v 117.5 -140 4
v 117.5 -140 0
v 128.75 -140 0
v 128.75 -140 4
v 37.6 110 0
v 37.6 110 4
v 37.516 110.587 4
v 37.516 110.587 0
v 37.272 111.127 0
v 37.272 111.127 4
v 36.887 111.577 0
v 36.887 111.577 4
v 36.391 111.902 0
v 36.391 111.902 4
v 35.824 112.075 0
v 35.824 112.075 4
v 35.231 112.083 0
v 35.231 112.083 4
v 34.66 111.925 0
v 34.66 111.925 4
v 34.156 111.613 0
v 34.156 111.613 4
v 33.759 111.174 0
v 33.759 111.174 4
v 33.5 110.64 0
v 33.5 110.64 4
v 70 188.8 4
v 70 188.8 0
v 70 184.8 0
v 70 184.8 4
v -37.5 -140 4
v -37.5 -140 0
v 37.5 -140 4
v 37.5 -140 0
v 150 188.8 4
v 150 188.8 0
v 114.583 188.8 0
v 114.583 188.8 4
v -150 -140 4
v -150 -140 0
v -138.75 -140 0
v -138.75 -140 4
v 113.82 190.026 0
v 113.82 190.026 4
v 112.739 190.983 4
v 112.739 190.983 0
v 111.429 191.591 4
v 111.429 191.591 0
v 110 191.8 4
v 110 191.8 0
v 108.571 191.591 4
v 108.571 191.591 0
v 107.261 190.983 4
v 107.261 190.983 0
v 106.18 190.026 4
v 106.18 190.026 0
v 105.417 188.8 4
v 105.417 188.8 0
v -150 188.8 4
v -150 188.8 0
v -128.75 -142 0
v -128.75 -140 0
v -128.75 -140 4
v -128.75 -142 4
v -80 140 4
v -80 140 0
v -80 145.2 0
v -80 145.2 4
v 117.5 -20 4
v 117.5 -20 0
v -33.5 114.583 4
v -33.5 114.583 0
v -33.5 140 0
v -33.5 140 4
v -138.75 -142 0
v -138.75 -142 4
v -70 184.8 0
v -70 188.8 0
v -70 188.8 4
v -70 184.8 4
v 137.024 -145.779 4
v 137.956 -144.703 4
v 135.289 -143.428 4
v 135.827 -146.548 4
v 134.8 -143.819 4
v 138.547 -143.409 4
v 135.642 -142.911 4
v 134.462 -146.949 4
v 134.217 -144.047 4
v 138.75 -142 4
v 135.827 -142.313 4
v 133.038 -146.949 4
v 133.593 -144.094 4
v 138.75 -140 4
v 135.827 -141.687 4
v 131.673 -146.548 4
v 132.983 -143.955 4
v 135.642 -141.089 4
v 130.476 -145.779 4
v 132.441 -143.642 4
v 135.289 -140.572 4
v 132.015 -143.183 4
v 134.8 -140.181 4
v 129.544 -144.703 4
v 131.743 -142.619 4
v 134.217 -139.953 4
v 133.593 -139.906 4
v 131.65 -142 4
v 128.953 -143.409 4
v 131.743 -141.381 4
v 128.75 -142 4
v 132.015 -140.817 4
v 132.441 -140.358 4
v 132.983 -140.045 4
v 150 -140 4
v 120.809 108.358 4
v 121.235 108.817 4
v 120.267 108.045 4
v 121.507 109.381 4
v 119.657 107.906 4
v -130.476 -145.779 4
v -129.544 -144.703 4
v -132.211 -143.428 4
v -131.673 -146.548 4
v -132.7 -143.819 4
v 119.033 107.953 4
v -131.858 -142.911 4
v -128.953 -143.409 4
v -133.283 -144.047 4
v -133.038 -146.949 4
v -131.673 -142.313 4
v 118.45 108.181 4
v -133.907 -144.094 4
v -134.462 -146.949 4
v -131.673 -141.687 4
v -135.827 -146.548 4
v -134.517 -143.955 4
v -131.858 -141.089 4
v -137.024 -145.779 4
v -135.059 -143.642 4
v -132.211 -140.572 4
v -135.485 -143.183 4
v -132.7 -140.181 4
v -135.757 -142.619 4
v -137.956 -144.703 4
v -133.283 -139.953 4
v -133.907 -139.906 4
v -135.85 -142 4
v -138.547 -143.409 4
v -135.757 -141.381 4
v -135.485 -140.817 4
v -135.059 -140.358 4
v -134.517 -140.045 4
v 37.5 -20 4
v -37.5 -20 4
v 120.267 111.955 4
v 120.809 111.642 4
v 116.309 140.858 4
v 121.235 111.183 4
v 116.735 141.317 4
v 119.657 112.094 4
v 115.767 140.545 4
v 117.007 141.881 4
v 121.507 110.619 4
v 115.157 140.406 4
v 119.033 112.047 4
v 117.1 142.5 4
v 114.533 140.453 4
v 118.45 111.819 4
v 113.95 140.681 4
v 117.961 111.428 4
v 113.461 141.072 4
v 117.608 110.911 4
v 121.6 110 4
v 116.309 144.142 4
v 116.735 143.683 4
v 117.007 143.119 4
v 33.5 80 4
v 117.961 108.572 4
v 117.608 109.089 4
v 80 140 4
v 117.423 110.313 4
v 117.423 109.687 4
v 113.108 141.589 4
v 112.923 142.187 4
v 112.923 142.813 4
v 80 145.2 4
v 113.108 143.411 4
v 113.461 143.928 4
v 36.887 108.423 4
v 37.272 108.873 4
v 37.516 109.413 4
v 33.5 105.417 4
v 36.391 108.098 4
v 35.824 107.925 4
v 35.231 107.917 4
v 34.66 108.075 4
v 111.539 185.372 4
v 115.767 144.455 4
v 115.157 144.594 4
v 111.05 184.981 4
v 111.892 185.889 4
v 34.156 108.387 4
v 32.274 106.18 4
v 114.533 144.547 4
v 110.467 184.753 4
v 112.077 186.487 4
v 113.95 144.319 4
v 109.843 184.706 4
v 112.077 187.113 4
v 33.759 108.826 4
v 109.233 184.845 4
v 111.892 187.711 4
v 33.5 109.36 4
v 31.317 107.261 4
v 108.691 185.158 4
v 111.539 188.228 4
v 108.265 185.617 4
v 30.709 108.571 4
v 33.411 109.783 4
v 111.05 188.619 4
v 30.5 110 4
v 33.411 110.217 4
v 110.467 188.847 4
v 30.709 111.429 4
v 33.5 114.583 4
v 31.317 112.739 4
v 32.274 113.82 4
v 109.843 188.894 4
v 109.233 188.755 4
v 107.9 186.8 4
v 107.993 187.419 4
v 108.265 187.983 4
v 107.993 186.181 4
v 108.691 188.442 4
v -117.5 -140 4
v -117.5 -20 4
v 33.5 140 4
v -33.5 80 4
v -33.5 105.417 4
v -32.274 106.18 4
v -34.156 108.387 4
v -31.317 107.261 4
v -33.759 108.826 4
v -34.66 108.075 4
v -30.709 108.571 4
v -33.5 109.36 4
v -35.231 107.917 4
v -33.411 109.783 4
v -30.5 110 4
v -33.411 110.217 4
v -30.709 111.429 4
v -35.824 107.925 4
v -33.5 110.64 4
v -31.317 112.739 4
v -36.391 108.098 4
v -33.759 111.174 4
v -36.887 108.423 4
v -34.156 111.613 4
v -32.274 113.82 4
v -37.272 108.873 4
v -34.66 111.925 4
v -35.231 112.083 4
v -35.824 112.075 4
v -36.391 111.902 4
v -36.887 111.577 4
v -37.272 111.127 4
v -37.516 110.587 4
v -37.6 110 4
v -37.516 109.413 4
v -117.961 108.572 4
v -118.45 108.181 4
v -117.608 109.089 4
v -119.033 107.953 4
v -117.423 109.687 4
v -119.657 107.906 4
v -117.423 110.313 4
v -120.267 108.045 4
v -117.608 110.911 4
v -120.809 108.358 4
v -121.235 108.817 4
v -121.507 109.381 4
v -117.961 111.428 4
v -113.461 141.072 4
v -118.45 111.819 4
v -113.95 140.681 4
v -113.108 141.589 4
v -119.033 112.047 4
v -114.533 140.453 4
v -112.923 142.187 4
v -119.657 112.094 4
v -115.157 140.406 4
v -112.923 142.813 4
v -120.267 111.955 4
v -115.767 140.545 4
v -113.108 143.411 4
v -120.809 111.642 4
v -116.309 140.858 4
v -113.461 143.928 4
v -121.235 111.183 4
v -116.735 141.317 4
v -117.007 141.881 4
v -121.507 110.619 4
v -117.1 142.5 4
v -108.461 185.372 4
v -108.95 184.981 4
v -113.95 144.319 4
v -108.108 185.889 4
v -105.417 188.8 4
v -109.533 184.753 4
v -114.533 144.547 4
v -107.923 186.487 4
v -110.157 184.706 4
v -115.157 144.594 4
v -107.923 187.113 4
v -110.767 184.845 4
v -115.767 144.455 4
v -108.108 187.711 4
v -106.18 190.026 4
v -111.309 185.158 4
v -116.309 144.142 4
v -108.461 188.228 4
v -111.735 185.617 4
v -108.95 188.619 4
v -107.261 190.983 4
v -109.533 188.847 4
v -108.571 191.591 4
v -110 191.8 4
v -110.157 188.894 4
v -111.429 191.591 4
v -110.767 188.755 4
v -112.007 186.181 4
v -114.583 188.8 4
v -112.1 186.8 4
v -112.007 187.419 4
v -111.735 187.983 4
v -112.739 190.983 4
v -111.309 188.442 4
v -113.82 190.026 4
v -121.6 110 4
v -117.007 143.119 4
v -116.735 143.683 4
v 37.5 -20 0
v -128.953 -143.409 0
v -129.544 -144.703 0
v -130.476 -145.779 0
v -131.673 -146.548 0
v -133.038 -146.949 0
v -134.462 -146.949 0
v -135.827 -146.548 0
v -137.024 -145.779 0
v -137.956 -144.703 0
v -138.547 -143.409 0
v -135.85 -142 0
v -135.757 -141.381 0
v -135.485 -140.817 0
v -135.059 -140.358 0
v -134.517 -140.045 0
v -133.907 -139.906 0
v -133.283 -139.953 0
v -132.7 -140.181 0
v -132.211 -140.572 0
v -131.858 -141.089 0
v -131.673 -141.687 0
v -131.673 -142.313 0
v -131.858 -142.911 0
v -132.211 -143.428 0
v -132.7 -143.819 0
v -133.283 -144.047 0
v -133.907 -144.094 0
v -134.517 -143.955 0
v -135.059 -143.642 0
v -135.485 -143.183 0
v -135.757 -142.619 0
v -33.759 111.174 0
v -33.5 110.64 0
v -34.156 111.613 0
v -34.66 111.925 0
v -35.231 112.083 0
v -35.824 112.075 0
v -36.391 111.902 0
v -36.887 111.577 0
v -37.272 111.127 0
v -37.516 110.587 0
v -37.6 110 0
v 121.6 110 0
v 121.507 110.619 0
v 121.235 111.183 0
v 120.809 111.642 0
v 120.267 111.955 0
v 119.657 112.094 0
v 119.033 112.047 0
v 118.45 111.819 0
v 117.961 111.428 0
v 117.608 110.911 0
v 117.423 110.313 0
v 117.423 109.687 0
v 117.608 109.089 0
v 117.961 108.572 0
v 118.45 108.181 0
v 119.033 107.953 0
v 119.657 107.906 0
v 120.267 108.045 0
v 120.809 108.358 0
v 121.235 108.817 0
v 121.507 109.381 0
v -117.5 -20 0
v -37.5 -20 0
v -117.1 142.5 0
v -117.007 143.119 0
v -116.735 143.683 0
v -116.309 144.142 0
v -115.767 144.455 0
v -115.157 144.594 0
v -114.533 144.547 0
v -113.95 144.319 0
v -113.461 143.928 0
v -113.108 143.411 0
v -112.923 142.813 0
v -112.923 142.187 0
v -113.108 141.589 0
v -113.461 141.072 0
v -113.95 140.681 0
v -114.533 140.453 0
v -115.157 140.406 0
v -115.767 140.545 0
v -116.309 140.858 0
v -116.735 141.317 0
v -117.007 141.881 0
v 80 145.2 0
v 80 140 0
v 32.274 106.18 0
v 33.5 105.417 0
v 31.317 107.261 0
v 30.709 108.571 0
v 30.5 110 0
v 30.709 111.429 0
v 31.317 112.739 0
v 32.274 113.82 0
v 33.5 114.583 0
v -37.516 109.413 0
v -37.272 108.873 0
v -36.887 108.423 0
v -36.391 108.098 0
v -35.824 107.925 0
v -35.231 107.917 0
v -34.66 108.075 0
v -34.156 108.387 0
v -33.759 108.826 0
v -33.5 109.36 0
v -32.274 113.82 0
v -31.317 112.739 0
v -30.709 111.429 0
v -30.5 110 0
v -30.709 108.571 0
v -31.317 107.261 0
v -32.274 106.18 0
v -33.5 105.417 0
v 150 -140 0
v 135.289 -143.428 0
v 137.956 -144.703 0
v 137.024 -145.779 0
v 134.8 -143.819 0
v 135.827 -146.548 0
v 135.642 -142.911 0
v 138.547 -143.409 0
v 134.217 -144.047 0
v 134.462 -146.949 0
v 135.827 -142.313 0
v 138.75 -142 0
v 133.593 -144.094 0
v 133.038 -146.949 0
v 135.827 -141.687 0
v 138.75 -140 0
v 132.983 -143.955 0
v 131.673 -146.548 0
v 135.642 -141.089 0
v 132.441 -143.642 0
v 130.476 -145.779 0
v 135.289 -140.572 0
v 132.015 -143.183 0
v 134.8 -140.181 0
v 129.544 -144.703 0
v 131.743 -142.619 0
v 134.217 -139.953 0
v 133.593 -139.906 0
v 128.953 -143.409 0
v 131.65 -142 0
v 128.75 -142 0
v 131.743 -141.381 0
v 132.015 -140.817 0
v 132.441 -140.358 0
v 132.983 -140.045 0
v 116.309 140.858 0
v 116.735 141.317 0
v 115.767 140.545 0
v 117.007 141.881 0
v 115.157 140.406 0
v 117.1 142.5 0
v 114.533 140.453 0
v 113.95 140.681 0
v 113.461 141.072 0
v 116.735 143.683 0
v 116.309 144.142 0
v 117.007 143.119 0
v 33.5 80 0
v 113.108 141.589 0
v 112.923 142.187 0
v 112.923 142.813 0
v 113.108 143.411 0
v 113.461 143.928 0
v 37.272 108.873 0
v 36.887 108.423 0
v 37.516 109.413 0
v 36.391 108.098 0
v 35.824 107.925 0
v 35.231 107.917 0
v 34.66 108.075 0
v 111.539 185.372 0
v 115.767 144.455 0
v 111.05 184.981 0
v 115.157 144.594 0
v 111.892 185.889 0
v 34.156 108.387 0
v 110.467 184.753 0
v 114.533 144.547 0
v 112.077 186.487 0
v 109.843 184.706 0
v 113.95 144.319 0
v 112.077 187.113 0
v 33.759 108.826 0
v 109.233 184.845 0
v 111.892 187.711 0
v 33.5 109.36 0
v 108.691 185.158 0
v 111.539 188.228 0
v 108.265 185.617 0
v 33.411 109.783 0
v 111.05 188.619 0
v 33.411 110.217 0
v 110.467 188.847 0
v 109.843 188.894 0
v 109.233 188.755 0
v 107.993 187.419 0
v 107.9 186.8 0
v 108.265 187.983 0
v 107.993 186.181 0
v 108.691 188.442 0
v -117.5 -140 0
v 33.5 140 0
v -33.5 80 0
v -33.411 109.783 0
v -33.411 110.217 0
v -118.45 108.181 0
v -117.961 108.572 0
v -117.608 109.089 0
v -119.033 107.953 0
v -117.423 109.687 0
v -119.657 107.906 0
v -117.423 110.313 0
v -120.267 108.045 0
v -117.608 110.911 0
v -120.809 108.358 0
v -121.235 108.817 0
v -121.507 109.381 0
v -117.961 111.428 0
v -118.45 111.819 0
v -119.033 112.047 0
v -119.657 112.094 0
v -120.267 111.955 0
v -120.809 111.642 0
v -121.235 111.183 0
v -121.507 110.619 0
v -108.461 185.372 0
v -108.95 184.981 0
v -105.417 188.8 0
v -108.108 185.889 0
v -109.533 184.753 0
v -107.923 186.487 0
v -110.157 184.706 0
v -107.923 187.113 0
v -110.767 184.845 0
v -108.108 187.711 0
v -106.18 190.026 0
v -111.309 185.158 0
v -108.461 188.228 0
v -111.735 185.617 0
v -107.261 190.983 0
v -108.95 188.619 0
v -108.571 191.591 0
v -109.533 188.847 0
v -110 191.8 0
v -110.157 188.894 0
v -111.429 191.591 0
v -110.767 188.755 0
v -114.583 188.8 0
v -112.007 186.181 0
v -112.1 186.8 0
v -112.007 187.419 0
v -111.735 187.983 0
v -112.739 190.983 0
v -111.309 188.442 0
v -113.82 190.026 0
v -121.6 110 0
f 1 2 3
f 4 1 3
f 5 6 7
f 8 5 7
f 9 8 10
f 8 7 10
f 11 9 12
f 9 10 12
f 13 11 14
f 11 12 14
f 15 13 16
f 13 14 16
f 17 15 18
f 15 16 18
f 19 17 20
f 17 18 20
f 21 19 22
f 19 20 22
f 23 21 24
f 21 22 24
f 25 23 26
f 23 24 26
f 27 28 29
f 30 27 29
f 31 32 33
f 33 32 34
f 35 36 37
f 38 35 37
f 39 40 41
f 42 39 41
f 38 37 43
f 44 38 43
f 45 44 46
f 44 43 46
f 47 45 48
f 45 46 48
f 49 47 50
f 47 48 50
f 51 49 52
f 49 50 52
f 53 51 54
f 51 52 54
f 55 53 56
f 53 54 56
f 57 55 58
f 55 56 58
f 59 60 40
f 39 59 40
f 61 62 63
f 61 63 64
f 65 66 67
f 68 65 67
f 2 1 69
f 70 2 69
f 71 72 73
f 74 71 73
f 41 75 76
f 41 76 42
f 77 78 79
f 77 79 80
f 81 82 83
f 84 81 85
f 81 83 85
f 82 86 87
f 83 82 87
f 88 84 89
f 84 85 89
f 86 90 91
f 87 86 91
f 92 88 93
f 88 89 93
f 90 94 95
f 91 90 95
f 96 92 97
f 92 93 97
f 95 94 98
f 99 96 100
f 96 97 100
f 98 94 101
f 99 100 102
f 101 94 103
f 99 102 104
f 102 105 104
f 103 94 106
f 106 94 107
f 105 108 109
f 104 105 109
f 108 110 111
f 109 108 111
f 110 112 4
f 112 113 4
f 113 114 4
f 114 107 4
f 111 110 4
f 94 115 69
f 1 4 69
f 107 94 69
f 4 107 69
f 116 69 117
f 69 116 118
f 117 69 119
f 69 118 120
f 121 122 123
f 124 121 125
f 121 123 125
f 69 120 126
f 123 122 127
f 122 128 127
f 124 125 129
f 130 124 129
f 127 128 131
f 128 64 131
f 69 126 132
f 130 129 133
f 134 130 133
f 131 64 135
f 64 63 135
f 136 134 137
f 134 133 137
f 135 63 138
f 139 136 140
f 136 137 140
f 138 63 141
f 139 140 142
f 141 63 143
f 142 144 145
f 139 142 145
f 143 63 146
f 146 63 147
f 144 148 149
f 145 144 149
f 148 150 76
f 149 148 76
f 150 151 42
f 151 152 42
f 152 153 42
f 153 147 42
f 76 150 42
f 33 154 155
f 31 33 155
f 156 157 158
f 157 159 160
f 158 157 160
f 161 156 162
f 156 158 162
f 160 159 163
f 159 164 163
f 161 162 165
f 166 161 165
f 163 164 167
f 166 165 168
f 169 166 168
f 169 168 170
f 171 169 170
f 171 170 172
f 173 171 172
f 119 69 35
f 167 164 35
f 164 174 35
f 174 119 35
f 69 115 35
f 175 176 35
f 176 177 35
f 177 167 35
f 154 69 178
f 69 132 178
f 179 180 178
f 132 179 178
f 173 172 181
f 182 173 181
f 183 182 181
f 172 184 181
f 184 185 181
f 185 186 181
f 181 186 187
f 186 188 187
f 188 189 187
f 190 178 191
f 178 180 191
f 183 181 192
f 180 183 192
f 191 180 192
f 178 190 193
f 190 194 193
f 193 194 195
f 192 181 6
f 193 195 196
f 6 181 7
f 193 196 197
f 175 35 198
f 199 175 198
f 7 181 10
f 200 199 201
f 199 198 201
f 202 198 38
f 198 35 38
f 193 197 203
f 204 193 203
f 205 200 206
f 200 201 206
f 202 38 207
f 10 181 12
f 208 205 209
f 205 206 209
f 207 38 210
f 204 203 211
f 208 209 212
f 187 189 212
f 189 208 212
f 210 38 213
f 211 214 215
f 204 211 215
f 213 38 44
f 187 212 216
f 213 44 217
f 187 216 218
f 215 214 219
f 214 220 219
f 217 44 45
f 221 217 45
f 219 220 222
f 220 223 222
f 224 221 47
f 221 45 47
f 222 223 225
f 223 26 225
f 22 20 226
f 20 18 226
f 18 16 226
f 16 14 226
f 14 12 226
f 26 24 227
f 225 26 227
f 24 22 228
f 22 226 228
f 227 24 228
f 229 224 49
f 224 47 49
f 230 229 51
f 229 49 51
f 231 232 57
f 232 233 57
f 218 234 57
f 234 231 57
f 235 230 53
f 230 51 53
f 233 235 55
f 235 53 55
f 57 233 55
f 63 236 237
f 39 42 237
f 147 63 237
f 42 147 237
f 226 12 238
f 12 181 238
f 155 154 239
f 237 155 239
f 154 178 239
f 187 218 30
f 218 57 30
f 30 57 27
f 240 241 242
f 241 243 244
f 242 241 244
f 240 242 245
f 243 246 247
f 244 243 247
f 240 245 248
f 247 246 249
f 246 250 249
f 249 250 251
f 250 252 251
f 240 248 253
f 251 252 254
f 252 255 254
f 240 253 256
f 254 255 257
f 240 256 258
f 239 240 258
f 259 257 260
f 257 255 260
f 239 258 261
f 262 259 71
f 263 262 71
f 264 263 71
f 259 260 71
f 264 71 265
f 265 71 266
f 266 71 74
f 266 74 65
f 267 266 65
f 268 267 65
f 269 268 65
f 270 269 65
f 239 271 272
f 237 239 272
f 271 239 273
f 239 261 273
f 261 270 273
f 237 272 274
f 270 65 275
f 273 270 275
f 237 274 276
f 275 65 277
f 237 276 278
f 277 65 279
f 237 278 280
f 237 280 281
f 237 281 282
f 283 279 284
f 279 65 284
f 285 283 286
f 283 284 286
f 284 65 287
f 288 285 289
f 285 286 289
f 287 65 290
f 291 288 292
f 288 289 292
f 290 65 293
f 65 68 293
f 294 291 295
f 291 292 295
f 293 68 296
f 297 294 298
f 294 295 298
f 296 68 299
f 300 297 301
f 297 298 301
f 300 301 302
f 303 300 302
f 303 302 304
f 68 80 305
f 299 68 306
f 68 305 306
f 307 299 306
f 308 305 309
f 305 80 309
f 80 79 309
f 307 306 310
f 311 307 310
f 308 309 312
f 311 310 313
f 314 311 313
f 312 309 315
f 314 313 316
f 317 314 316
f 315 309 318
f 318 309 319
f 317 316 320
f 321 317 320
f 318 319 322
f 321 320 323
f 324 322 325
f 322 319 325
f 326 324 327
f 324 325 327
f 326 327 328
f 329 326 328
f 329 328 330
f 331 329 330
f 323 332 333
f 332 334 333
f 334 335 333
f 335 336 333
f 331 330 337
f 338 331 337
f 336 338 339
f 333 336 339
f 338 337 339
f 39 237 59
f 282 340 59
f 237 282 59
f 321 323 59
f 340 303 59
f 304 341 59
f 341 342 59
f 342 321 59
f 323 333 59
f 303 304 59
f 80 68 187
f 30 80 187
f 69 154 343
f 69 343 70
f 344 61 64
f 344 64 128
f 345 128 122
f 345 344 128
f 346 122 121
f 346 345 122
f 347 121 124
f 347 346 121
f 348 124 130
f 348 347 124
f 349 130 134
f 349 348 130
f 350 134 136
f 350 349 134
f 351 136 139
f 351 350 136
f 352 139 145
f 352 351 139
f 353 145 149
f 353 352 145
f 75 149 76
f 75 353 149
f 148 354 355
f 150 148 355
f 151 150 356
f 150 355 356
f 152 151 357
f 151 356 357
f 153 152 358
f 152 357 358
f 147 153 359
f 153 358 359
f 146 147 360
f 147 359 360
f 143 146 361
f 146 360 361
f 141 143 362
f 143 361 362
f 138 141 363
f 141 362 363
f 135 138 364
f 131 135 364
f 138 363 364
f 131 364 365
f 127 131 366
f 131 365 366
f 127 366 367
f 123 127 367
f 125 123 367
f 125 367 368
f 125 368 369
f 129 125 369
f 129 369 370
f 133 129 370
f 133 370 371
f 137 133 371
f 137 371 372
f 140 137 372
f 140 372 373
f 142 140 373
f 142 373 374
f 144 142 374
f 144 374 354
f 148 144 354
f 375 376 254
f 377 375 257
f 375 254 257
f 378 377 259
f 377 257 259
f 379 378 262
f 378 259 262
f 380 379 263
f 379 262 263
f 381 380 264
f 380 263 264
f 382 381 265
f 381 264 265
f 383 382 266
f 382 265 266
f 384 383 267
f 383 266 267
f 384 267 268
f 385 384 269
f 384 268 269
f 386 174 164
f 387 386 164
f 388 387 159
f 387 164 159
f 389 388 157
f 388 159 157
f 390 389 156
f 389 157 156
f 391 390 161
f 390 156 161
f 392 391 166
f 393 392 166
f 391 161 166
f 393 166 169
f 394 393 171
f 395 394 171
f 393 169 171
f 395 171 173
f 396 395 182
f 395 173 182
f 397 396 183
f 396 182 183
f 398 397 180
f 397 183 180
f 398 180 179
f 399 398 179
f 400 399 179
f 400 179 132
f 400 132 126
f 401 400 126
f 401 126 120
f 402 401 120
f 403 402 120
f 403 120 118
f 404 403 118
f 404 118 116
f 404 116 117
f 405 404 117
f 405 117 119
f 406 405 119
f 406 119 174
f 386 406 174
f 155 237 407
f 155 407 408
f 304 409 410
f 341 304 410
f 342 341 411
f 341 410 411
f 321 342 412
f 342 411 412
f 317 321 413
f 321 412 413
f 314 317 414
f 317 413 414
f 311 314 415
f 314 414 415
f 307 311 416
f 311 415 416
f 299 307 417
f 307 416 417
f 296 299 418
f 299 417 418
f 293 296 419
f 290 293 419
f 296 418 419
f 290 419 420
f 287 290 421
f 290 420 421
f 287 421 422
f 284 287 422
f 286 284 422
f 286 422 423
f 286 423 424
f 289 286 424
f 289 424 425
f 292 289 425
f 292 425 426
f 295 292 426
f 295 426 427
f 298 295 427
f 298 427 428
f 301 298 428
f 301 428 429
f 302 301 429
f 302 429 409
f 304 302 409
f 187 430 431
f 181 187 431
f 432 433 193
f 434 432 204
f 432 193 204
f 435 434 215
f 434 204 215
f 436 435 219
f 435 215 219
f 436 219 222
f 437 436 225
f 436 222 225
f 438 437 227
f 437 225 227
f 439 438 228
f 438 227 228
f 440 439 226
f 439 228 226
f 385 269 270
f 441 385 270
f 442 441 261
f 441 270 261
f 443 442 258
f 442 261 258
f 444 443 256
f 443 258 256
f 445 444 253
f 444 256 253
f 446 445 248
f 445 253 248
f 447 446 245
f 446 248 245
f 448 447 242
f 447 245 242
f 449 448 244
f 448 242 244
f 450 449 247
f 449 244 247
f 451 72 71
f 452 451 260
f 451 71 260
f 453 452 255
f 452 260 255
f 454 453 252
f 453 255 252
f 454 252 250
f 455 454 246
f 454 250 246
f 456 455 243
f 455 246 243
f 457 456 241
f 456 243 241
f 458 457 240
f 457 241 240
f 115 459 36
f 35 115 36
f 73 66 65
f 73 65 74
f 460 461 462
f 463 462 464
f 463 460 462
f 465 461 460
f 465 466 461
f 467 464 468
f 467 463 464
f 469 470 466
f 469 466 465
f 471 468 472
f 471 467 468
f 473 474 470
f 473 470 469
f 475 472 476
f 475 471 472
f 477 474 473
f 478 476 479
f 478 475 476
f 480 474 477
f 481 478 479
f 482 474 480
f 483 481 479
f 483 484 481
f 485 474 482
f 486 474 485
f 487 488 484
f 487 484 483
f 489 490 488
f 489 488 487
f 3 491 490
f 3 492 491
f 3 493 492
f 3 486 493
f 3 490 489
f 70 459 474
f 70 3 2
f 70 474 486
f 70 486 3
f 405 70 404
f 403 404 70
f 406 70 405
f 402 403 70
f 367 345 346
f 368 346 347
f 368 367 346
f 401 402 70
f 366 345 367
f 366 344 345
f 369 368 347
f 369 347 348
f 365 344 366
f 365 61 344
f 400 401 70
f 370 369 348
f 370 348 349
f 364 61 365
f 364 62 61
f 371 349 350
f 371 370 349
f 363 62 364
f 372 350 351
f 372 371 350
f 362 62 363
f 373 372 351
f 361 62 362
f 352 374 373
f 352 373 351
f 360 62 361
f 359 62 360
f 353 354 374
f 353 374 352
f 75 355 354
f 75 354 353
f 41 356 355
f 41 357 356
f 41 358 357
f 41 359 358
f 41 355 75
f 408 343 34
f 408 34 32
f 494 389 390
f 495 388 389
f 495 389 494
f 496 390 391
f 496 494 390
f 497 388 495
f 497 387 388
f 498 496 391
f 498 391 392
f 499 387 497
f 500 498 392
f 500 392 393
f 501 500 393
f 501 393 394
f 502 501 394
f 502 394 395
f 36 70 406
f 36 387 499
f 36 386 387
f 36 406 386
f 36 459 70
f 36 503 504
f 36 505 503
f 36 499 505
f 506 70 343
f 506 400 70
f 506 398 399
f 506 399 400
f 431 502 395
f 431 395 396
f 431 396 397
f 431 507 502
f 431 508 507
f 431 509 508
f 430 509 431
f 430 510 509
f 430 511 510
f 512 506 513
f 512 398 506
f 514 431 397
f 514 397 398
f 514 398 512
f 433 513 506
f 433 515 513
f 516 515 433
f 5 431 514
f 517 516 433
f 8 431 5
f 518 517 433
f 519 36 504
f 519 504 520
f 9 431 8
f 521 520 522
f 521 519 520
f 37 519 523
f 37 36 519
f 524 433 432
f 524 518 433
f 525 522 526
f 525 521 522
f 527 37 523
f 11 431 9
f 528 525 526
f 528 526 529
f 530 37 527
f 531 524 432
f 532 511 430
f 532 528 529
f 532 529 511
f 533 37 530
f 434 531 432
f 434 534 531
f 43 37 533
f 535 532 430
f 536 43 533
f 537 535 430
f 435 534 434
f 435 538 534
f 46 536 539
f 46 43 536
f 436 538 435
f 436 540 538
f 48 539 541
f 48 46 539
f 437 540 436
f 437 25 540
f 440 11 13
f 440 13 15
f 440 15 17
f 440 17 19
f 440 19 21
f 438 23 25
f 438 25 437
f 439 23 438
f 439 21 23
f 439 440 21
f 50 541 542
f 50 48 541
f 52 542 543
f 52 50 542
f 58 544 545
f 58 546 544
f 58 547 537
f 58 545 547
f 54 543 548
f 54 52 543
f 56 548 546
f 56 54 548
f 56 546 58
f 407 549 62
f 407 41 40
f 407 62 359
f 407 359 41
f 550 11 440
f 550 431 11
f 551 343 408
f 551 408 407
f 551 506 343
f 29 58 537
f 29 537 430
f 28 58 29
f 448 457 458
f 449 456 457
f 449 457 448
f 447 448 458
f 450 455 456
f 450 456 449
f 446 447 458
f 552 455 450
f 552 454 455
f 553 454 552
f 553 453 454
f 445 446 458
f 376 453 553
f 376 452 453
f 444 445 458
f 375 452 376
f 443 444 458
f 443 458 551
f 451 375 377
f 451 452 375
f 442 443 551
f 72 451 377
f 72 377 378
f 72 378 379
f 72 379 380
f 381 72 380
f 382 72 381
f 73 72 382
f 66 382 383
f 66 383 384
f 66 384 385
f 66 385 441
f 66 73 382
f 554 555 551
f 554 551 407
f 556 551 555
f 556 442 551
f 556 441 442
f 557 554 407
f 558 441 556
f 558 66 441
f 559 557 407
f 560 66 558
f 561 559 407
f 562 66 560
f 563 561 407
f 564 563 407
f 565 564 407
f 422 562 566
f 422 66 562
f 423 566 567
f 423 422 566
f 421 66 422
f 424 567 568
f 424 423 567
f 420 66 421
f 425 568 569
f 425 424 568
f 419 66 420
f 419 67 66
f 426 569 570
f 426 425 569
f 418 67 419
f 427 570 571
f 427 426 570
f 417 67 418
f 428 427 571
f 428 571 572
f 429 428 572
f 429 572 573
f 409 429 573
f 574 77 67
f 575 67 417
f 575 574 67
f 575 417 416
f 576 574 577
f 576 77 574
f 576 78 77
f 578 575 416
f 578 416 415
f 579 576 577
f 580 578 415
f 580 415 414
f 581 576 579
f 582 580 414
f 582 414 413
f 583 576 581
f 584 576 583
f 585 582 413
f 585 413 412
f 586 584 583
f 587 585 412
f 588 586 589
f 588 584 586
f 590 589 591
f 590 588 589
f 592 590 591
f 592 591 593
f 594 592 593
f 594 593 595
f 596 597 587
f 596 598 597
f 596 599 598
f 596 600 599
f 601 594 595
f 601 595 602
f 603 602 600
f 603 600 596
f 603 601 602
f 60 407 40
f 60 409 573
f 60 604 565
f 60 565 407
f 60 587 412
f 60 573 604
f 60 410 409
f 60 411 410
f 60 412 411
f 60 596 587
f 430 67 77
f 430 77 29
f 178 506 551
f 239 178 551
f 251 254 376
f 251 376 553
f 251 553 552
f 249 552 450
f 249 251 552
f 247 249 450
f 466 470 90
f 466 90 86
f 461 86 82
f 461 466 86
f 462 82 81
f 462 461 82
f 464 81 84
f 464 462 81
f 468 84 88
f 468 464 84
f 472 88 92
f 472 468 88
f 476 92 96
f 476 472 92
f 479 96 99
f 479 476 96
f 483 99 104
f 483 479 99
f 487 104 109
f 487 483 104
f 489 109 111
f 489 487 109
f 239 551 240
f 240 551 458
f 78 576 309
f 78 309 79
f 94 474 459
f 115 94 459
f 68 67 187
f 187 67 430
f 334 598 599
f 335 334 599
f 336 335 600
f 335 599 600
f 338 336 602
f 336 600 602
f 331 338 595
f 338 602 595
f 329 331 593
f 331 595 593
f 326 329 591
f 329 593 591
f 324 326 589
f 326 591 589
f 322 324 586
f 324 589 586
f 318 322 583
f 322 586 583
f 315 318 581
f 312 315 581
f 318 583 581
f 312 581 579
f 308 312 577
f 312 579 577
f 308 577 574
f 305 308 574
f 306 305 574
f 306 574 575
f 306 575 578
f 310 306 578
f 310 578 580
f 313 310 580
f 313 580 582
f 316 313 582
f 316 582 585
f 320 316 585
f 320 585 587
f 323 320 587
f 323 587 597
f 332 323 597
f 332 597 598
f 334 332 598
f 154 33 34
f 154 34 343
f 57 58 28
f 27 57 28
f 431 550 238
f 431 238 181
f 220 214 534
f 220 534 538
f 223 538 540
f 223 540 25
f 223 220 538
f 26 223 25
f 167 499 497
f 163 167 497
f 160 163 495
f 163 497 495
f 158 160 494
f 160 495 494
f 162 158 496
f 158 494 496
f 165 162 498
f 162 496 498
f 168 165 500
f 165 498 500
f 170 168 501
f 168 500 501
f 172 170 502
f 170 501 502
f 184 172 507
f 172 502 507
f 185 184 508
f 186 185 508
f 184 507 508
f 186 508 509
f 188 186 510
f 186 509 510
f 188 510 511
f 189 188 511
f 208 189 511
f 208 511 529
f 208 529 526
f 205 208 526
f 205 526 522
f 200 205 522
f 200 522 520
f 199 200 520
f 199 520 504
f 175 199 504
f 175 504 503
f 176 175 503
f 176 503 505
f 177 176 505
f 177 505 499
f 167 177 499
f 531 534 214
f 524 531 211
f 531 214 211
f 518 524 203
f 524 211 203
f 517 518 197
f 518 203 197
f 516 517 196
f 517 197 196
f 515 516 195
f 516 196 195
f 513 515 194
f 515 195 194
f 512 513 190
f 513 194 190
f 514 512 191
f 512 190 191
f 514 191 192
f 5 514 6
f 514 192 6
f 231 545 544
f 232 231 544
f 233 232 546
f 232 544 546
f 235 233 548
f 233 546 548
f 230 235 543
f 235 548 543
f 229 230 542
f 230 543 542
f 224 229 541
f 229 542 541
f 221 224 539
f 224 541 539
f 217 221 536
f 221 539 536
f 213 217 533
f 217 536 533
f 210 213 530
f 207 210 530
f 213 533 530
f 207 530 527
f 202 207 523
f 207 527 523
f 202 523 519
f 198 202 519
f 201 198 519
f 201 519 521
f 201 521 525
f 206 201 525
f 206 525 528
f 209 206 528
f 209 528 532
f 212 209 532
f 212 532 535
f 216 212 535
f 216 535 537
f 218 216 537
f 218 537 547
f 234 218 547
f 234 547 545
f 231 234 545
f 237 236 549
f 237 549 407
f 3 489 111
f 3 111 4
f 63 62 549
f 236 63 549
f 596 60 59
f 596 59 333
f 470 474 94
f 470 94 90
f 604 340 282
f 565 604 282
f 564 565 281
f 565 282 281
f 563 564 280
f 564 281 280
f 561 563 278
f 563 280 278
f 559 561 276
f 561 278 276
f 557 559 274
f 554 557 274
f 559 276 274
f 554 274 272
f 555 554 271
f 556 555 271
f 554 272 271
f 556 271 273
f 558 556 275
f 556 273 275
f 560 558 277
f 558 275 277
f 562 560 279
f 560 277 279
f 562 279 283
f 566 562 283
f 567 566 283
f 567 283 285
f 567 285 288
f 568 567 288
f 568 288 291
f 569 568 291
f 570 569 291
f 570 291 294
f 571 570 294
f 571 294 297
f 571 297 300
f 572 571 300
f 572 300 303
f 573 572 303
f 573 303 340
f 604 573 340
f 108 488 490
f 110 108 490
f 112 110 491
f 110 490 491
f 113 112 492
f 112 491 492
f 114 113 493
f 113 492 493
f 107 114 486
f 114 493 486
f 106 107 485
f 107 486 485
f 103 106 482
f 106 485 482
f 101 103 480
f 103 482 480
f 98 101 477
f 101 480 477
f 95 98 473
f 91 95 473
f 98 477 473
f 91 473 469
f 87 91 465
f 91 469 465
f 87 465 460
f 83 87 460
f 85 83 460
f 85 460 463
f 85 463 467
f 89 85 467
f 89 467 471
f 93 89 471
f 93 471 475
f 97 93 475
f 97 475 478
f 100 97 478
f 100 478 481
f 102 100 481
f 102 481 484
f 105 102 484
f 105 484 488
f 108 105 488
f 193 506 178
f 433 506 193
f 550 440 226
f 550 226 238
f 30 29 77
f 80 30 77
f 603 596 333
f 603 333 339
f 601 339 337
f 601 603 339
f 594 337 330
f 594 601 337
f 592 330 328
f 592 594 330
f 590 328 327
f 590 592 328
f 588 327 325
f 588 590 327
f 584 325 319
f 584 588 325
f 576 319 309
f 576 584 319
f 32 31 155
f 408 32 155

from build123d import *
from build123d.topology import SkipClean

# Parameters (mm, degrees)
ESQUISSE1_W             = 300
ESQUISSE1_H             = 280
BOSS_EXTRU_1_DEPTH      = 4
ESQUISSE2_W             = 80
ESQUISSE2_H             = 120
ENL_V_MAT_EXTRU_1_DEPTH = 206.221831197
ESQUISSE4_W             = 67
ESQUISSE4_H             = 60
ENL_V_MAT_EXTRU_3_DEPTH = 206.221831197
BOSS_EXTRU_2_DEPTH      = 4
ESQUISSE6_R             = 2.1
ENL_V_MAT_EXTRU_4_DEPTH = 211.059515376
BOSS_EXTRU_3_DEPTH      = 4
BOSS_EXTRU_4_DEPTH      = 4
ESQUISSE9_R             = 2.1
ENL_V_MAT_EXTRU_5_DEPTH = 244.522565689
ESQUISSE10_R            = 2.1
ENL_V_MAT_EXTRU_6_DEPTH = 244.522565689
ESQUISSE11_R            = 2.1
ENL_V_MAT_EXTRU_7_DEPTH = 244.522565689
BOSS_EXTRU_5_START      = -4
ESQUISSE12_R            = 5
ESQUISSE12_R_2          = 2.1
BOSS_EXTRU_5_DEPTH      = 4


with BuildPart() as part:
    # Esquisse1 → Boss.-Extru.1 (new body)
    with BuildSketch(Plane.XY):
        Rectangle(ESQUISSE1_W, ESQUISSE1_H)
    extrude(amount=BOSS_EXTRU_1_DEPTH)

    # Esquisse2 → Enlèv. mat.-Extru.1 (cut, through all)
    with BuildSketch(Plane.XY.offset(4)):
        with Locations((77.5, -80)):
            Rectangle(ESQUISSE2_W, ESQUISSE2_H)
        with Locations((-77.5, -80)):
            Rectangle(ESQUISSE2_W, ESQUISSE2_H)
    extrude(amount=-ENL_V_MAT_EXTRU_1_DEPTH, mode=Mode.SUBTRACT)

    # Esquisse4 → Enlèv. mat.-Extru.3 (cut, through all)
    with BuildSketch(Plane(origin=(0, 0, 0), x_dir=(-1, 0, 0), z_dir=(0, 0, -1))):
        with Locations((0, 110)):
            Rectangle(ESQUISSE4_W, ESQUISSE4_H)
    extrude(amount=-ENL_V_MAT_EXTRU_3_DEPTH, mode=Mode.SUBTRACT)

    # Esquisse5 → Boss.-Extru.2 (add)
    with BuildSketch(Plane(origin=(0, 0, 0), x_dir=(-1, 0, 0), z_dir=(0, 0, -1))):
        with BuildLine():
            Line((-128.75, -142), (-128.75, -140))
            Line((-128.75, -140), (-138.75, -140))
            Line((-138.75, -140), (-138.75, -142))
            ThreePointArc((-138.75, -142), (-133.75, -147), (-128.75, -142))
        make_face()
        with BuildLine():
            Line((138.75, -140), (128.75, -140))
            Line((128.75, -140), (128.75, -142))
            ThreePointArc((128.75, -142), (133.75, -147), (138.75, -142))
            Line((138.75, -142), (138.75, -140))
        make_face()
    extrude(amount=-BOSS_EXTRU_2_DEPTH)

    # Esquisse6 → Enlèv. mat.-Extru.4 (cut, through all)
    with BuildSketch(Plane(origin=(0, 0, 0), x_dir=(-1, 0, 0), z_dir=(0, 0, -1))):
        with Locations((-133.75, -142)):
            Circle(ESQUISSE6_R)
        with Locations((133.75, -142)):
            Circle(ESQUISSE6_R)
    extrude(amount=-ENL_V_MAT_EXTRU_4_DEPTH, mode=Mode.SUBTRACT)

    # Esquisse7 → Boss.-Extru.3 (add)
    with BuildSketch(Plane(origin=(0, 0, 0), x_dir=(-1, 0, 0), z_dir=(0, 0, -1))):
        Polygon((-150, 140), (-150, 184.8), (150, 184.8), (150, 140), (80, 140), (80, 145.2), (-80, 145.2), (-80, 140), align=None)
    extrude(amount=-BOSS_EXTRU_3_DEPTH)

    # Esquisse8 → Boss.-Extru.4 (add)
    with BuildSketch(Plane(origin=(0, 0, 0), x_dir=(-1, 0, 0), z_dir=(0, 0, -1))):
        with BuildLine():
            Line((-150, 184.8), (-150, 188.8))
            Line((-150, 188.8), (-114.582575695, 188.8))
            ThreePointArc((-114.582575695, 188.8), (-110, 191.8), (-105.417424305, 188.8))
            Line((-105.417424305, 188.8), (-70, 188.8))
            Line((-70, 188.8), (-70, 184.8))
            Line((-70, 184.8), (-150, 184.8))
        make_face()
        with BuildLine():
            Line((105.417424305, 188.8), (70, 188.8))
            Line((70, 188.8), (70, 184.8))
            Line((70, 184.8), (150, 184.8))
            Line((150, 184.8), (150, 188.8))
            Line((150, 188.8), (114.582575695, 188.8))
            ThreePointArc((114.582575695, 188.8), (110, 191.8), (105.417424305, 188.8))
        make_face()
    extrude(amount=-BOSS_EXTRU_4_DEPTH)

    # Esquisse9 → Enlèv. mat.-Extru.5 (cut, through all)
    with BuildSketch(Plane(origin=(0, 0, 0), x_dir=(-1, 0, 0), z_dir=(0, 0, -1))):
        with Locations((-110, 186.8)):
            Circle(ESQUISSE9_R)
        with Locations((110, 186.8)):
            Circle(ESQUISSE9_R)
    extrude(amount=-ENL_V_MAT_EXTRU_5_DEPTH, mode=Mode.SUBTRACT)

    # Esquisse10 → Enlèv. mat.-Extru.6 (cut, through all)
    with BuildSketch(Plane(origin=(0, 0, 0), x_dir=(-1, 0, 0), z_dir=(0, 0, -1))):
        with Locations((115, 142.5)):
            Circle(ESQUISSE10_R)
        with Locations((-115, 142.5)):
            Circle(ESQUISSE10_R)
    extrude(amount=-ENL_V_MAT_EXTRU_6_DEPTH, mode=Mode.SUBTRACT)

    # Esquisse11 → Enlèv. mat.-Extru.7 (cut, through all)
    with BuildSketch(Plane.XY.offset(4)):
        with Locations((35.5, 110)):
            Circle(ESQUISSE11_R)
        with Locations((119.5, 110)):
            Circle(ESQUISSE11_R)
        with Locations((-119.5, 110)):
            Circle(ESQUISSE11_R)
        with Locations((-35.5, 110)):
            Circle(ESQUISSE11_R)
    extrude(amount=-ENL_V_MAT_EXTRU_7_DEPTH, mode=Mode.SUBTRACT)

    # Esquisse12 → Boss.-Extru.5 (add)
    # profile 1 of 2: a face of its own
    with SkipClean():  # the faces are left unmerged after this step: merging them gives an invalid solid
        with BuildSketch(Plane(origin=(0, 0, 0), x_dir=(-1, 0, 0), z_dir=(0, 0, -1)).offset(BOSS_EXTRU_5_START)):
            with Locations((-35.5, 110)):
                Circle(ESQUISSE12_R)
            with Locations((-35.5, 110)):
                Circle(ESQUISSE12_R_2, mode=Mode.SUBTRACT)
        # profile 2 of 2: a face of its own
        with BuildSketch(Plane(origin=(0, 0, 0), x_dir=(-1, 0, 0), z_dir=(0, 0, -1)).offset(BOSS_EXTRU_5_START)):
            with Locations((35.5, 110)):
                Circle(ESQUISSE12_R)
            with Locations((35.5, 110)):
                Circle(ESQUISSE12_R_2, mode=Mode.SUBTRACT)
        extrude(amount=BOSS_EXTRU_5_DEPTH)
    add(part.part.scale(1), mode=Mode.REPLACE)  # the faces are merged on a copy


solid = part.part
